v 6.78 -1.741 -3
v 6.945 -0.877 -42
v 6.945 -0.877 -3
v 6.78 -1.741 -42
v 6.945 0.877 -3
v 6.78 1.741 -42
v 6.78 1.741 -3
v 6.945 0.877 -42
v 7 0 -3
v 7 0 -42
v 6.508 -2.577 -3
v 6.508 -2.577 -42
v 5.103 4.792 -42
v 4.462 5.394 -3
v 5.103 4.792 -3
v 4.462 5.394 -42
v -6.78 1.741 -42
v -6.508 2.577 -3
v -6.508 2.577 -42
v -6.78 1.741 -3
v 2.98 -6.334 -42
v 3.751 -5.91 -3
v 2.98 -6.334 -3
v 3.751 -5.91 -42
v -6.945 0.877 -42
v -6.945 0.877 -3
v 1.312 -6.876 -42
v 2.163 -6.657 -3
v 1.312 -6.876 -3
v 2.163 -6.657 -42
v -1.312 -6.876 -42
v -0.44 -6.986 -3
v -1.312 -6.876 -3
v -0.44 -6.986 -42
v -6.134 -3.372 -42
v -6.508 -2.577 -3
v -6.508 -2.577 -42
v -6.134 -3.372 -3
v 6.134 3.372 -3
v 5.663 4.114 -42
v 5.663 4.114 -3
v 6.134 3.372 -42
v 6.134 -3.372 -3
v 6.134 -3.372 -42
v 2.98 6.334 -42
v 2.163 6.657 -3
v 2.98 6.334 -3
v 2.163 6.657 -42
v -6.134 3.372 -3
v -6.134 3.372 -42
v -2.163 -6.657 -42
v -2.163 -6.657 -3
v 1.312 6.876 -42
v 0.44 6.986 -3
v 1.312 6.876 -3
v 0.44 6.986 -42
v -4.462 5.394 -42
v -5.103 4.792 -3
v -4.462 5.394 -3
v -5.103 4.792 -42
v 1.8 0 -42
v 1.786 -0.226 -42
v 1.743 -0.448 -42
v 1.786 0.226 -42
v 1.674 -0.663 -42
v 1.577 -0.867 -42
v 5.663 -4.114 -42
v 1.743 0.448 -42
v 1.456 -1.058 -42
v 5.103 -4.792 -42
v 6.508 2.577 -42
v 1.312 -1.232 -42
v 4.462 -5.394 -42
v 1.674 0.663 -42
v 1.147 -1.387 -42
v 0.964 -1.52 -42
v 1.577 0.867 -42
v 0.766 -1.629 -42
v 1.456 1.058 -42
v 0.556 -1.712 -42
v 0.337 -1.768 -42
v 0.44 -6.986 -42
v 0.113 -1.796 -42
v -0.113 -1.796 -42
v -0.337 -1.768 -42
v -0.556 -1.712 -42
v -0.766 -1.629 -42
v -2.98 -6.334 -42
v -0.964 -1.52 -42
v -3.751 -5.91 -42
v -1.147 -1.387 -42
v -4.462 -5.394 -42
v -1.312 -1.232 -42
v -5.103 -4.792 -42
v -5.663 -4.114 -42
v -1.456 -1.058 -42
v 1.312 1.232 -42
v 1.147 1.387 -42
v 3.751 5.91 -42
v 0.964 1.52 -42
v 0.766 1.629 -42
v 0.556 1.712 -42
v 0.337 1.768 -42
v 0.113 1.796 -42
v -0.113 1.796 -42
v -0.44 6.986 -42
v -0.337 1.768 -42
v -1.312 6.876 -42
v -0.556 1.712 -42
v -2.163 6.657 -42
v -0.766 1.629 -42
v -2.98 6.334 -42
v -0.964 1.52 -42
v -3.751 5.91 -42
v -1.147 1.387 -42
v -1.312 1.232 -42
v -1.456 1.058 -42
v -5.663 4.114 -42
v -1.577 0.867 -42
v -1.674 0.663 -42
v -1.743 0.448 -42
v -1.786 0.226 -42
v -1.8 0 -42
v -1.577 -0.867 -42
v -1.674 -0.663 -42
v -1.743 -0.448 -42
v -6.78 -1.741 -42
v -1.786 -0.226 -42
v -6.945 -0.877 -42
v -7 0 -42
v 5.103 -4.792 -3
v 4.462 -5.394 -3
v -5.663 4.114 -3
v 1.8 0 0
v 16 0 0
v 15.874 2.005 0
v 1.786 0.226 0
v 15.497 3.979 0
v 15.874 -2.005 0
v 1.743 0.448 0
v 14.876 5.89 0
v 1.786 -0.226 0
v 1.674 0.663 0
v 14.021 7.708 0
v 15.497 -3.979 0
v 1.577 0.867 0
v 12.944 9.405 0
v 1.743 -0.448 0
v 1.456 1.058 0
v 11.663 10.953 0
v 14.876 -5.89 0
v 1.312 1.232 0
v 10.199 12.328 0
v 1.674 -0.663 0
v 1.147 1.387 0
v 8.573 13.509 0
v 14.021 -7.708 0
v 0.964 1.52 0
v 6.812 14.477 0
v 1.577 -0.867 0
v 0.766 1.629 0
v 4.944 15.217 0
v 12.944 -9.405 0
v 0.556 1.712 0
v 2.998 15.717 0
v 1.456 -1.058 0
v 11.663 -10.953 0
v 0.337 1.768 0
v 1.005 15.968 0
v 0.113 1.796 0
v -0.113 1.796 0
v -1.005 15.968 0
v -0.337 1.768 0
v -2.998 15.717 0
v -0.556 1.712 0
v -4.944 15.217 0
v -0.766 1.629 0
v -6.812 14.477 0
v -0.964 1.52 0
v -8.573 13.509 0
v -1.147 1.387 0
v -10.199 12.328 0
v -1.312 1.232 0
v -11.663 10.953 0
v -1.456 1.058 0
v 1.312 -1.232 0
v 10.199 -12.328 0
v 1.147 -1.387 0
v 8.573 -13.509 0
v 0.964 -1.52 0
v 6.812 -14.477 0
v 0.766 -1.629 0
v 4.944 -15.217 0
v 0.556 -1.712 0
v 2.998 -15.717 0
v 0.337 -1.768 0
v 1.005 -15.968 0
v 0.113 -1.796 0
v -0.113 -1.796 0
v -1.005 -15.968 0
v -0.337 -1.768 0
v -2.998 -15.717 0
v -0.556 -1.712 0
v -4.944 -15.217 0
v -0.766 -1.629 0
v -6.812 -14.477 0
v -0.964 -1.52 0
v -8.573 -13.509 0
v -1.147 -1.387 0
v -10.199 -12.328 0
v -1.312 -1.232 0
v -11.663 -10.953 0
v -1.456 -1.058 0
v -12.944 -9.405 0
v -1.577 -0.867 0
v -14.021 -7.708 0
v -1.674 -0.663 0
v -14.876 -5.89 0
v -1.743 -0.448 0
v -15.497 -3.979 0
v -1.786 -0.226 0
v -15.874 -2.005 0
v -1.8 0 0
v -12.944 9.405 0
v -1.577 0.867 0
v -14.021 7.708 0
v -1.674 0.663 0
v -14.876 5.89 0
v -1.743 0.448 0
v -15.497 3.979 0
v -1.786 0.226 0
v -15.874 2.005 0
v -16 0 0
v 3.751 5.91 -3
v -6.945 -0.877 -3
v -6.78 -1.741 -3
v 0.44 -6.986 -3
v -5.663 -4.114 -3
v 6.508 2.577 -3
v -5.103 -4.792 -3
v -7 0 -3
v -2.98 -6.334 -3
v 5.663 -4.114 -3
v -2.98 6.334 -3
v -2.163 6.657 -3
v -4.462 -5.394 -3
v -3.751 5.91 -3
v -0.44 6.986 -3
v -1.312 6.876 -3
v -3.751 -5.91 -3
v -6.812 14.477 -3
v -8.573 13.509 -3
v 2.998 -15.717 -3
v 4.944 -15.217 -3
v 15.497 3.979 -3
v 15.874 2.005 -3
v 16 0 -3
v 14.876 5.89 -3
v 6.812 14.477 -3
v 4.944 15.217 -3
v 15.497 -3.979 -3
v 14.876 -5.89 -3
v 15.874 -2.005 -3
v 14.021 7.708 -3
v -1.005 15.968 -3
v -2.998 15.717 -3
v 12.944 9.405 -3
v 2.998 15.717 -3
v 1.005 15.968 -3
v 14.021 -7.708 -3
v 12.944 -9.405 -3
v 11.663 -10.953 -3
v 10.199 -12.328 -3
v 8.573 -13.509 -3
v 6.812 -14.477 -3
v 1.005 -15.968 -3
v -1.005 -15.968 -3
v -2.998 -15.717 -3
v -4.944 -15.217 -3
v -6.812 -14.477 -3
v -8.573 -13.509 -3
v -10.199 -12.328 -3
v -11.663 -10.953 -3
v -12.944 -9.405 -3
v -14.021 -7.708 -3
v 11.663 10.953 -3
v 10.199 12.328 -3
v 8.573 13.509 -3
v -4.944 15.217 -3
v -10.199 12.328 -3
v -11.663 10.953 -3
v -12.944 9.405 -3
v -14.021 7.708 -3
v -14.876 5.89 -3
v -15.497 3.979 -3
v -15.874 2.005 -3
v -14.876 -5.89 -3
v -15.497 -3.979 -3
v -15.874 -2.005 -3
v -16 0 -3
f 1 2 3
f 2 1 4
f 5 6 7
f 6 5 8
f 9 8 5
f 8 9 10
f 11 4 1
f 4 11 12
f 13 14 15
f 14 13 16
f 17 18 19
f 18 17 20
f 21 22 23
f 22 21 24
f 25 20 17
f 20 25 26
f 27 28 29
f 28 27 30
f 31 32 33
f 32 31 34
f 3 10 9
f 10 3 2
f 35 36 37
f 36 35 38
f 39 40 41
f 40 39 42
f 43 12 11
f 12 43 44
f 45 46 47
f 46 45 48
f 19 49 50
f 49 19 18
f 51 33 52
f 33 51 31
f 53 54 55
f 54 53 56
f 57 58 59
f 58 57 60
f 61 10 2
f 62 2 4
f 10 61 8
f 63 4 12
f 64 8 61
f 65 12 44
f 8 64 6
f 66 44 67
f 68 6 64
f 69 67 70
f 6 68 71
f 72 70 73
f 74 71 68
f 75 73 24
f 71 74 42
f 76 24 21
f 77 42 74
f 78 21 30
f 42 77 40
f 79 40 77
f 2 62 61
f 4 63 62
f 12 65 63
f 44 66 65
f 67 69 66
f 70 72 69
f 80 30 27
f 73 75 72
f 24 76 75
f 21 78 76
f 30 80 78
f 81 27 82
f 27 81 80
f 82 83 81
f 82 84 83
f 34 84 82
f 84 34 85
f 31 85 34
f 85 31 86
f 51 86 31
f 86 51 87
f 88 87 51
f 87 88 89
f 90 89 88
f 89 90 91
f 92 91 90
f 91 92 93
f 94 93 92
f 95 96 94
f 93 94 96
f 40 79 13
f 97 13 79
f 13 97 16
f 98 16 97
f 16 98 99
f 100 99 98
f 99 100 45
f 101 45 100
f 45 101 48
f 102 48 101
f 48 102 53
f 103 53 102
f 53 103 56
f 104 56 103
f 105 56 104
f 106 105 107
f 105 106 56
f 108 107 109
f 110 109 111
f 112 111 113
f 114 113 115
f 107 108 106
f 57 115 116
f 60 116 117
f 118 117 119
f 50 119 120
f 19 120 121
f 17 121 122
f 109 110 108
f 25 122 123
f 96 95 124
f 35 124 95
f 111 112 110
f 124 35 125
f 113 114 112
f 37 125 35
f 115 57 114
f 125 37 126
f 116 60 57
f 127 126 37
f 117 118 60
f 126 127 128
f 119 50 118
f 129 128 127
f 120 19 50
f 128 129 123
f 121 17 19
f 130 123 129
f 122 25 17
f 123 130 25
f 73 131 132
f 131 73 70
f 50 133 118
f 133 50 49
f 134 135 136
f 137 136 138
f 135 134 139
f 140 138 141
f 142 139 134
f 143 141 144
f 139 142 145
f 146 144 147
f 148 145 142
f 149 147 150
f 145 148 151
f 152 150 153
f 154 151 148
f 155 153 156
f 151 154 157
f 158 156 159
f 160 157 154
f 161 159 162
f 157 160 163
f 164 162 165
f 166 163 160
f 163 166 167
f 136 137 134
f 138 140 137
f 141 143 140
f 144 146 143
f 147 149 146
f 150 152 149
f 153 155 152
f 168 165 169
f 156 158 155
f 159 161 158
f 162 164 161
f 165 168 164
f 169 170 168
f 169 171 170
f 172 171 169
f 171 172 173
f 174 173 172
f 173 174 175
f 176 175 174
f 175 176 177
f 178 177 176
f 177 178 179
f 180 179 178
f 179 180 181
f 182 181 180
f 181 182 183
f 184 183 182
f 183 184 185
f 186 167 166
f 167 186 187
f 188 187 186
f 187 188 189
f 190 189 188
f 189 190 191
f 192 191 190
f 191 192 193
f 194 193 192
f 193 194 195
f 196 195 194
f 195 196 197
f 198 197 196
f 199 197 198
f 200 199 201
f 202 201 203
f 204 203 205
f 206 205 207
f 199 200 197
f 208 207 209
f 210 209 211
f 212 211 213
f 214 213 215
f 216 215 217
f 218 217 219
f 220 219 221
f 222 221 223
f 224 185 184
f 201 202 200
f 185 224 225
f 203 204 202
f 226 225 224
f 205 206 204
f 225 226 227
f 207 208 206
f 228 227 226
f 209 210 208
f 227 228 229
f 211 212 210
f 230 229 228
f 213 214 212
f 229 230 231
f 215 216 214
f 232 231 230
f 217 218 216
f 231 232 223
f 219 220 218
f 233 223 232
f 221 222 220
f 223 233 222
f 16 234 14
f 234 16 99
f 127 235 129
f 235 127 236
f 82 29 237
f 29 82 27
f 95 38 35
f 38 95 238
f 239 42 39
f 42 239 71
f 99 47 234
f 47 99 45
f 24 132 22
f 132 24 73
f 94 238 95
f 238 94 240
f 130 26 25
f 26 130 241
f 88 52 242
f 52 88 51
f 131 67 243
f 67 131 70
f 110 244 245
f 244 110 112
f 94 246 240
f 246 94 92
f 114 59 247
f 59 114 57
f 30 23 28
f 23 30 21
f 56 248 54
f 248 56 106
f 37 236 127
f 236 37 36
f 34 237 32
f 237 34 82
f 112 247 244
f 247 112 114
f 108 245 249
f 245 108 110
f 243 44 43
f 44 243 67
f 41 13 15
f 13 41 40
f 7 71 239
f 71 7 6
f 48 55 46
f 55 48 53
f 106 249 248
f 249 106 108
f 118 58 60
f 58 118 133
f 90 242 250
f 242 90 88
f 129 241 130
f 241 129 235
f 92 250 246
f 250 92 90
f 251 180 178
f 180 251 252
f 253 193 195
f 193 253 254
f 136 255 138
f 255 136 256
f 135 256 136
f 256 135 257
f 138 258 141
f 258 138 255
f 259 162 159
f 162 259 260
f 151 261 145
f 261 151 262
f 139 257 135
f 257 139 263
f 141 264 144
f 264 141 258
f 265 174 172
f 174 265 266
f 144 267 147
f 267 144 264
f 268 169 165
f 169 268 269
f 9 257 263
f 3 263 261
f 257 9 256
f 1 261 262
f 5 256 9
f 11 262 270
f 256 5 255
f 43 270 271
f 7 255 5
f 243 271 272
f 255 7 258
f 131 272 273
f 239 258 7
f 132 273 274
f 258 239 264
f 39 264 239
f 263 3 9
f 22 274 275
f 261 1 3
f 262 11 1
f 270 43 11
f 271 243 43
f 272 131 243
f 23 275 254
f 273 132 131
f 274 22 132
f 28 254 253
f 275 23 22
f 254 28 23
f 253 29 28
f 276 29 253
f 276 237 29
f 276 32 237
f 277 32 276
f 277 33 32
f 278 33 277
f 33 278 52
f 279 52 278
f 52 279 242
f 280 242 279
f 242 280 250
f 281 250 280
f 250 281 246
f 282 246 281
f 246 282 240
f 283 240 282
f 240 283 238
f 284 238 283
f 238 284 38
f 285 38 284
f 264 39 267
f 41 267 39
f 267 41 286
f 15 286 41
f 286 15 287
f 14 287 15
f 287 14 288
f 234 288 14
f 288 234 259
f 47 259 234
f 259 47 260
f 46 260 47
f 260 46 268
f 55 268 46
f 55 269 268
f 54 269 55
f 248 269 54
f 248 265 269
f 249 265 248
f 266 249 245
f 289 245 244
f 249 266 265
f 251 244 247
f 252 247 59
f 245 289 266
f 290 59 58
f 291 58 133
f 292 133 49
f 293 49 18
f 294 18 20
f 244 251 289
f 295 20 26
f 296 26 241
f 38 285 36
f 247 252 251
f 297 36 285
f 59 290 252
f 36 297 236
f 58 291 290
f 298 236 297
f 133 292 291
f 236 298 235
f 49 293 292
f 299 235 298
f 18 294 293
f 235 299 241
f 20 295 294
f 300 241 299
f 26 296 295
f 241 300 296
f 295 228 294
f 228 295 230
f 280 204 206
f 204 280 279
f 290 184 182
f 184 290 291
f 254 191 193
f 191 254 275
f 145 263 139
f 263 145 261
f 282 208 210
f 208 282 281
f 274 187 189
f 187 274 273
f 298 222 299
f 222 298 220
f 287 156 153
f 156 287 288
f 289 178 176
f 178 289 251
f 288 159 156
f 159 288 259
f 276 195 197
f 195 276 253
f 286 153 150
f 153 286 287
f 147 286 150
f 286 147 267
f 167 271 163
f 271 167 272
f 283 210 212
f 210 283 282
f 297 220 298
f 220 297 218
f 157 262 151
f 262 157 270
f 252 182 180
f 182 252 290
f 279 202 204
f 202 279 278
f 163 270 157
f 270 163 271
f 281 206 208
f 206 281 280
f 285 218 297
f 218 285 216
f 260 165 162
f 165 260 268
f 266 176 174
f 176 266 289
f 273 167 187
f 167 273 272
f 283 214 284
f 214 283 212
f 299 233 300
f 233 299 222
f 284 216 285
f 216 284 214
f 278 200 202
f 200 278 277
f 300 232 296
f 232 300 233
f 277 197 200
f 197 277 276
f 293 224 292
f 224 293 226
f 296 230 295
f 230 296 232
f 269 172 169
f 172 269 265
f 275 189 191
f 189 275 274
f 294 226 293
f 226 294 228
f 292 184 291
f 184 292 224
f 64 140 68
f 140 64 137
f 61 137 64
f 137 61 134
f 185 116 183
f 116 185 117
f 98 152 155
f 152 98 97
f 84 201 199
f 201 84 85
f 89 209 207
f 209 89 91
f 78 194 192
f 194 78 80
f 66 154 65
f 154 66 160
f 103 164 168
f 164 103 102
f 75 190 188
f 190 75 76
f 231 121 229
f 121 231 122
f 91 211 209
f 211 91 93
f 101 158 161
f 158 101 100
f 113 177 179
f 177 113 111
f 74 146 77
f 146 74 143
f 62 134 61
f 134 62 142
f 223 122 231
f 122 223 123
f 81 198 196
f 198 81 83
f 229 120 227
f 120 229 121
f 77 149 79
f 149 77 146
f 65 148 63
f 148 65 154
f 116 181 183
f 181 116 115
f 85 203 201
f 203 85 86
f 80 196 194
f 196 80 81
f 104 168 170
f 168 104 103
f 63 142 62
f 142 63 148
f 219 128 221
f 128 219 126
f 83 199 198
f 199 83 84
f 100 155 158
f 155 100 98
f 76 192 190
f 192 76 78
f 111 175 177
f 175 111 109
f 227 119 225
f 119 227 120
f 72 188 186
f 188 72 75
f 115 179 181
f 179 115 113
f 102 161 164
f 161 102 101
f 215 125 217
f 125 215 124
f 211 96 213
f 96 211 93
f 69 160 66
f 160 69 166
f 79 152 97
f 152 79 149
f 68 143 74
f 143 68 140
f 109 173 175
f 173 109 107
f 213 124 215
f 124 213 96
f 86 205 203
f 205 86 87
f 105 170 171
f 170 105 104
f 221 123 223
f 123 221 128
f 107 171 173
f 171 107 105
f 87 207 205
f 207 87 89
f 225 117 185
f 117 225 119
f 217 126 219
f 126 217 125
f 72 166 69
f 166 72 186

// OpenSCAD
$fn = 50;


difference() {
	union() {
		translate(v = [0, 0, -42.0000000000]) {
			cylinder(h = 42, r = 7.0000000000);
		}
		translate(v = [0, 0, -3.0000000000]) {
			cylinder(h = 3, r = 16.0000000000);
		}
	}
	union() {
		#translate(v = [0, 0, -42]) {
			cylinder(h = 42, r = 1.8000000000);
		}
	}
}
